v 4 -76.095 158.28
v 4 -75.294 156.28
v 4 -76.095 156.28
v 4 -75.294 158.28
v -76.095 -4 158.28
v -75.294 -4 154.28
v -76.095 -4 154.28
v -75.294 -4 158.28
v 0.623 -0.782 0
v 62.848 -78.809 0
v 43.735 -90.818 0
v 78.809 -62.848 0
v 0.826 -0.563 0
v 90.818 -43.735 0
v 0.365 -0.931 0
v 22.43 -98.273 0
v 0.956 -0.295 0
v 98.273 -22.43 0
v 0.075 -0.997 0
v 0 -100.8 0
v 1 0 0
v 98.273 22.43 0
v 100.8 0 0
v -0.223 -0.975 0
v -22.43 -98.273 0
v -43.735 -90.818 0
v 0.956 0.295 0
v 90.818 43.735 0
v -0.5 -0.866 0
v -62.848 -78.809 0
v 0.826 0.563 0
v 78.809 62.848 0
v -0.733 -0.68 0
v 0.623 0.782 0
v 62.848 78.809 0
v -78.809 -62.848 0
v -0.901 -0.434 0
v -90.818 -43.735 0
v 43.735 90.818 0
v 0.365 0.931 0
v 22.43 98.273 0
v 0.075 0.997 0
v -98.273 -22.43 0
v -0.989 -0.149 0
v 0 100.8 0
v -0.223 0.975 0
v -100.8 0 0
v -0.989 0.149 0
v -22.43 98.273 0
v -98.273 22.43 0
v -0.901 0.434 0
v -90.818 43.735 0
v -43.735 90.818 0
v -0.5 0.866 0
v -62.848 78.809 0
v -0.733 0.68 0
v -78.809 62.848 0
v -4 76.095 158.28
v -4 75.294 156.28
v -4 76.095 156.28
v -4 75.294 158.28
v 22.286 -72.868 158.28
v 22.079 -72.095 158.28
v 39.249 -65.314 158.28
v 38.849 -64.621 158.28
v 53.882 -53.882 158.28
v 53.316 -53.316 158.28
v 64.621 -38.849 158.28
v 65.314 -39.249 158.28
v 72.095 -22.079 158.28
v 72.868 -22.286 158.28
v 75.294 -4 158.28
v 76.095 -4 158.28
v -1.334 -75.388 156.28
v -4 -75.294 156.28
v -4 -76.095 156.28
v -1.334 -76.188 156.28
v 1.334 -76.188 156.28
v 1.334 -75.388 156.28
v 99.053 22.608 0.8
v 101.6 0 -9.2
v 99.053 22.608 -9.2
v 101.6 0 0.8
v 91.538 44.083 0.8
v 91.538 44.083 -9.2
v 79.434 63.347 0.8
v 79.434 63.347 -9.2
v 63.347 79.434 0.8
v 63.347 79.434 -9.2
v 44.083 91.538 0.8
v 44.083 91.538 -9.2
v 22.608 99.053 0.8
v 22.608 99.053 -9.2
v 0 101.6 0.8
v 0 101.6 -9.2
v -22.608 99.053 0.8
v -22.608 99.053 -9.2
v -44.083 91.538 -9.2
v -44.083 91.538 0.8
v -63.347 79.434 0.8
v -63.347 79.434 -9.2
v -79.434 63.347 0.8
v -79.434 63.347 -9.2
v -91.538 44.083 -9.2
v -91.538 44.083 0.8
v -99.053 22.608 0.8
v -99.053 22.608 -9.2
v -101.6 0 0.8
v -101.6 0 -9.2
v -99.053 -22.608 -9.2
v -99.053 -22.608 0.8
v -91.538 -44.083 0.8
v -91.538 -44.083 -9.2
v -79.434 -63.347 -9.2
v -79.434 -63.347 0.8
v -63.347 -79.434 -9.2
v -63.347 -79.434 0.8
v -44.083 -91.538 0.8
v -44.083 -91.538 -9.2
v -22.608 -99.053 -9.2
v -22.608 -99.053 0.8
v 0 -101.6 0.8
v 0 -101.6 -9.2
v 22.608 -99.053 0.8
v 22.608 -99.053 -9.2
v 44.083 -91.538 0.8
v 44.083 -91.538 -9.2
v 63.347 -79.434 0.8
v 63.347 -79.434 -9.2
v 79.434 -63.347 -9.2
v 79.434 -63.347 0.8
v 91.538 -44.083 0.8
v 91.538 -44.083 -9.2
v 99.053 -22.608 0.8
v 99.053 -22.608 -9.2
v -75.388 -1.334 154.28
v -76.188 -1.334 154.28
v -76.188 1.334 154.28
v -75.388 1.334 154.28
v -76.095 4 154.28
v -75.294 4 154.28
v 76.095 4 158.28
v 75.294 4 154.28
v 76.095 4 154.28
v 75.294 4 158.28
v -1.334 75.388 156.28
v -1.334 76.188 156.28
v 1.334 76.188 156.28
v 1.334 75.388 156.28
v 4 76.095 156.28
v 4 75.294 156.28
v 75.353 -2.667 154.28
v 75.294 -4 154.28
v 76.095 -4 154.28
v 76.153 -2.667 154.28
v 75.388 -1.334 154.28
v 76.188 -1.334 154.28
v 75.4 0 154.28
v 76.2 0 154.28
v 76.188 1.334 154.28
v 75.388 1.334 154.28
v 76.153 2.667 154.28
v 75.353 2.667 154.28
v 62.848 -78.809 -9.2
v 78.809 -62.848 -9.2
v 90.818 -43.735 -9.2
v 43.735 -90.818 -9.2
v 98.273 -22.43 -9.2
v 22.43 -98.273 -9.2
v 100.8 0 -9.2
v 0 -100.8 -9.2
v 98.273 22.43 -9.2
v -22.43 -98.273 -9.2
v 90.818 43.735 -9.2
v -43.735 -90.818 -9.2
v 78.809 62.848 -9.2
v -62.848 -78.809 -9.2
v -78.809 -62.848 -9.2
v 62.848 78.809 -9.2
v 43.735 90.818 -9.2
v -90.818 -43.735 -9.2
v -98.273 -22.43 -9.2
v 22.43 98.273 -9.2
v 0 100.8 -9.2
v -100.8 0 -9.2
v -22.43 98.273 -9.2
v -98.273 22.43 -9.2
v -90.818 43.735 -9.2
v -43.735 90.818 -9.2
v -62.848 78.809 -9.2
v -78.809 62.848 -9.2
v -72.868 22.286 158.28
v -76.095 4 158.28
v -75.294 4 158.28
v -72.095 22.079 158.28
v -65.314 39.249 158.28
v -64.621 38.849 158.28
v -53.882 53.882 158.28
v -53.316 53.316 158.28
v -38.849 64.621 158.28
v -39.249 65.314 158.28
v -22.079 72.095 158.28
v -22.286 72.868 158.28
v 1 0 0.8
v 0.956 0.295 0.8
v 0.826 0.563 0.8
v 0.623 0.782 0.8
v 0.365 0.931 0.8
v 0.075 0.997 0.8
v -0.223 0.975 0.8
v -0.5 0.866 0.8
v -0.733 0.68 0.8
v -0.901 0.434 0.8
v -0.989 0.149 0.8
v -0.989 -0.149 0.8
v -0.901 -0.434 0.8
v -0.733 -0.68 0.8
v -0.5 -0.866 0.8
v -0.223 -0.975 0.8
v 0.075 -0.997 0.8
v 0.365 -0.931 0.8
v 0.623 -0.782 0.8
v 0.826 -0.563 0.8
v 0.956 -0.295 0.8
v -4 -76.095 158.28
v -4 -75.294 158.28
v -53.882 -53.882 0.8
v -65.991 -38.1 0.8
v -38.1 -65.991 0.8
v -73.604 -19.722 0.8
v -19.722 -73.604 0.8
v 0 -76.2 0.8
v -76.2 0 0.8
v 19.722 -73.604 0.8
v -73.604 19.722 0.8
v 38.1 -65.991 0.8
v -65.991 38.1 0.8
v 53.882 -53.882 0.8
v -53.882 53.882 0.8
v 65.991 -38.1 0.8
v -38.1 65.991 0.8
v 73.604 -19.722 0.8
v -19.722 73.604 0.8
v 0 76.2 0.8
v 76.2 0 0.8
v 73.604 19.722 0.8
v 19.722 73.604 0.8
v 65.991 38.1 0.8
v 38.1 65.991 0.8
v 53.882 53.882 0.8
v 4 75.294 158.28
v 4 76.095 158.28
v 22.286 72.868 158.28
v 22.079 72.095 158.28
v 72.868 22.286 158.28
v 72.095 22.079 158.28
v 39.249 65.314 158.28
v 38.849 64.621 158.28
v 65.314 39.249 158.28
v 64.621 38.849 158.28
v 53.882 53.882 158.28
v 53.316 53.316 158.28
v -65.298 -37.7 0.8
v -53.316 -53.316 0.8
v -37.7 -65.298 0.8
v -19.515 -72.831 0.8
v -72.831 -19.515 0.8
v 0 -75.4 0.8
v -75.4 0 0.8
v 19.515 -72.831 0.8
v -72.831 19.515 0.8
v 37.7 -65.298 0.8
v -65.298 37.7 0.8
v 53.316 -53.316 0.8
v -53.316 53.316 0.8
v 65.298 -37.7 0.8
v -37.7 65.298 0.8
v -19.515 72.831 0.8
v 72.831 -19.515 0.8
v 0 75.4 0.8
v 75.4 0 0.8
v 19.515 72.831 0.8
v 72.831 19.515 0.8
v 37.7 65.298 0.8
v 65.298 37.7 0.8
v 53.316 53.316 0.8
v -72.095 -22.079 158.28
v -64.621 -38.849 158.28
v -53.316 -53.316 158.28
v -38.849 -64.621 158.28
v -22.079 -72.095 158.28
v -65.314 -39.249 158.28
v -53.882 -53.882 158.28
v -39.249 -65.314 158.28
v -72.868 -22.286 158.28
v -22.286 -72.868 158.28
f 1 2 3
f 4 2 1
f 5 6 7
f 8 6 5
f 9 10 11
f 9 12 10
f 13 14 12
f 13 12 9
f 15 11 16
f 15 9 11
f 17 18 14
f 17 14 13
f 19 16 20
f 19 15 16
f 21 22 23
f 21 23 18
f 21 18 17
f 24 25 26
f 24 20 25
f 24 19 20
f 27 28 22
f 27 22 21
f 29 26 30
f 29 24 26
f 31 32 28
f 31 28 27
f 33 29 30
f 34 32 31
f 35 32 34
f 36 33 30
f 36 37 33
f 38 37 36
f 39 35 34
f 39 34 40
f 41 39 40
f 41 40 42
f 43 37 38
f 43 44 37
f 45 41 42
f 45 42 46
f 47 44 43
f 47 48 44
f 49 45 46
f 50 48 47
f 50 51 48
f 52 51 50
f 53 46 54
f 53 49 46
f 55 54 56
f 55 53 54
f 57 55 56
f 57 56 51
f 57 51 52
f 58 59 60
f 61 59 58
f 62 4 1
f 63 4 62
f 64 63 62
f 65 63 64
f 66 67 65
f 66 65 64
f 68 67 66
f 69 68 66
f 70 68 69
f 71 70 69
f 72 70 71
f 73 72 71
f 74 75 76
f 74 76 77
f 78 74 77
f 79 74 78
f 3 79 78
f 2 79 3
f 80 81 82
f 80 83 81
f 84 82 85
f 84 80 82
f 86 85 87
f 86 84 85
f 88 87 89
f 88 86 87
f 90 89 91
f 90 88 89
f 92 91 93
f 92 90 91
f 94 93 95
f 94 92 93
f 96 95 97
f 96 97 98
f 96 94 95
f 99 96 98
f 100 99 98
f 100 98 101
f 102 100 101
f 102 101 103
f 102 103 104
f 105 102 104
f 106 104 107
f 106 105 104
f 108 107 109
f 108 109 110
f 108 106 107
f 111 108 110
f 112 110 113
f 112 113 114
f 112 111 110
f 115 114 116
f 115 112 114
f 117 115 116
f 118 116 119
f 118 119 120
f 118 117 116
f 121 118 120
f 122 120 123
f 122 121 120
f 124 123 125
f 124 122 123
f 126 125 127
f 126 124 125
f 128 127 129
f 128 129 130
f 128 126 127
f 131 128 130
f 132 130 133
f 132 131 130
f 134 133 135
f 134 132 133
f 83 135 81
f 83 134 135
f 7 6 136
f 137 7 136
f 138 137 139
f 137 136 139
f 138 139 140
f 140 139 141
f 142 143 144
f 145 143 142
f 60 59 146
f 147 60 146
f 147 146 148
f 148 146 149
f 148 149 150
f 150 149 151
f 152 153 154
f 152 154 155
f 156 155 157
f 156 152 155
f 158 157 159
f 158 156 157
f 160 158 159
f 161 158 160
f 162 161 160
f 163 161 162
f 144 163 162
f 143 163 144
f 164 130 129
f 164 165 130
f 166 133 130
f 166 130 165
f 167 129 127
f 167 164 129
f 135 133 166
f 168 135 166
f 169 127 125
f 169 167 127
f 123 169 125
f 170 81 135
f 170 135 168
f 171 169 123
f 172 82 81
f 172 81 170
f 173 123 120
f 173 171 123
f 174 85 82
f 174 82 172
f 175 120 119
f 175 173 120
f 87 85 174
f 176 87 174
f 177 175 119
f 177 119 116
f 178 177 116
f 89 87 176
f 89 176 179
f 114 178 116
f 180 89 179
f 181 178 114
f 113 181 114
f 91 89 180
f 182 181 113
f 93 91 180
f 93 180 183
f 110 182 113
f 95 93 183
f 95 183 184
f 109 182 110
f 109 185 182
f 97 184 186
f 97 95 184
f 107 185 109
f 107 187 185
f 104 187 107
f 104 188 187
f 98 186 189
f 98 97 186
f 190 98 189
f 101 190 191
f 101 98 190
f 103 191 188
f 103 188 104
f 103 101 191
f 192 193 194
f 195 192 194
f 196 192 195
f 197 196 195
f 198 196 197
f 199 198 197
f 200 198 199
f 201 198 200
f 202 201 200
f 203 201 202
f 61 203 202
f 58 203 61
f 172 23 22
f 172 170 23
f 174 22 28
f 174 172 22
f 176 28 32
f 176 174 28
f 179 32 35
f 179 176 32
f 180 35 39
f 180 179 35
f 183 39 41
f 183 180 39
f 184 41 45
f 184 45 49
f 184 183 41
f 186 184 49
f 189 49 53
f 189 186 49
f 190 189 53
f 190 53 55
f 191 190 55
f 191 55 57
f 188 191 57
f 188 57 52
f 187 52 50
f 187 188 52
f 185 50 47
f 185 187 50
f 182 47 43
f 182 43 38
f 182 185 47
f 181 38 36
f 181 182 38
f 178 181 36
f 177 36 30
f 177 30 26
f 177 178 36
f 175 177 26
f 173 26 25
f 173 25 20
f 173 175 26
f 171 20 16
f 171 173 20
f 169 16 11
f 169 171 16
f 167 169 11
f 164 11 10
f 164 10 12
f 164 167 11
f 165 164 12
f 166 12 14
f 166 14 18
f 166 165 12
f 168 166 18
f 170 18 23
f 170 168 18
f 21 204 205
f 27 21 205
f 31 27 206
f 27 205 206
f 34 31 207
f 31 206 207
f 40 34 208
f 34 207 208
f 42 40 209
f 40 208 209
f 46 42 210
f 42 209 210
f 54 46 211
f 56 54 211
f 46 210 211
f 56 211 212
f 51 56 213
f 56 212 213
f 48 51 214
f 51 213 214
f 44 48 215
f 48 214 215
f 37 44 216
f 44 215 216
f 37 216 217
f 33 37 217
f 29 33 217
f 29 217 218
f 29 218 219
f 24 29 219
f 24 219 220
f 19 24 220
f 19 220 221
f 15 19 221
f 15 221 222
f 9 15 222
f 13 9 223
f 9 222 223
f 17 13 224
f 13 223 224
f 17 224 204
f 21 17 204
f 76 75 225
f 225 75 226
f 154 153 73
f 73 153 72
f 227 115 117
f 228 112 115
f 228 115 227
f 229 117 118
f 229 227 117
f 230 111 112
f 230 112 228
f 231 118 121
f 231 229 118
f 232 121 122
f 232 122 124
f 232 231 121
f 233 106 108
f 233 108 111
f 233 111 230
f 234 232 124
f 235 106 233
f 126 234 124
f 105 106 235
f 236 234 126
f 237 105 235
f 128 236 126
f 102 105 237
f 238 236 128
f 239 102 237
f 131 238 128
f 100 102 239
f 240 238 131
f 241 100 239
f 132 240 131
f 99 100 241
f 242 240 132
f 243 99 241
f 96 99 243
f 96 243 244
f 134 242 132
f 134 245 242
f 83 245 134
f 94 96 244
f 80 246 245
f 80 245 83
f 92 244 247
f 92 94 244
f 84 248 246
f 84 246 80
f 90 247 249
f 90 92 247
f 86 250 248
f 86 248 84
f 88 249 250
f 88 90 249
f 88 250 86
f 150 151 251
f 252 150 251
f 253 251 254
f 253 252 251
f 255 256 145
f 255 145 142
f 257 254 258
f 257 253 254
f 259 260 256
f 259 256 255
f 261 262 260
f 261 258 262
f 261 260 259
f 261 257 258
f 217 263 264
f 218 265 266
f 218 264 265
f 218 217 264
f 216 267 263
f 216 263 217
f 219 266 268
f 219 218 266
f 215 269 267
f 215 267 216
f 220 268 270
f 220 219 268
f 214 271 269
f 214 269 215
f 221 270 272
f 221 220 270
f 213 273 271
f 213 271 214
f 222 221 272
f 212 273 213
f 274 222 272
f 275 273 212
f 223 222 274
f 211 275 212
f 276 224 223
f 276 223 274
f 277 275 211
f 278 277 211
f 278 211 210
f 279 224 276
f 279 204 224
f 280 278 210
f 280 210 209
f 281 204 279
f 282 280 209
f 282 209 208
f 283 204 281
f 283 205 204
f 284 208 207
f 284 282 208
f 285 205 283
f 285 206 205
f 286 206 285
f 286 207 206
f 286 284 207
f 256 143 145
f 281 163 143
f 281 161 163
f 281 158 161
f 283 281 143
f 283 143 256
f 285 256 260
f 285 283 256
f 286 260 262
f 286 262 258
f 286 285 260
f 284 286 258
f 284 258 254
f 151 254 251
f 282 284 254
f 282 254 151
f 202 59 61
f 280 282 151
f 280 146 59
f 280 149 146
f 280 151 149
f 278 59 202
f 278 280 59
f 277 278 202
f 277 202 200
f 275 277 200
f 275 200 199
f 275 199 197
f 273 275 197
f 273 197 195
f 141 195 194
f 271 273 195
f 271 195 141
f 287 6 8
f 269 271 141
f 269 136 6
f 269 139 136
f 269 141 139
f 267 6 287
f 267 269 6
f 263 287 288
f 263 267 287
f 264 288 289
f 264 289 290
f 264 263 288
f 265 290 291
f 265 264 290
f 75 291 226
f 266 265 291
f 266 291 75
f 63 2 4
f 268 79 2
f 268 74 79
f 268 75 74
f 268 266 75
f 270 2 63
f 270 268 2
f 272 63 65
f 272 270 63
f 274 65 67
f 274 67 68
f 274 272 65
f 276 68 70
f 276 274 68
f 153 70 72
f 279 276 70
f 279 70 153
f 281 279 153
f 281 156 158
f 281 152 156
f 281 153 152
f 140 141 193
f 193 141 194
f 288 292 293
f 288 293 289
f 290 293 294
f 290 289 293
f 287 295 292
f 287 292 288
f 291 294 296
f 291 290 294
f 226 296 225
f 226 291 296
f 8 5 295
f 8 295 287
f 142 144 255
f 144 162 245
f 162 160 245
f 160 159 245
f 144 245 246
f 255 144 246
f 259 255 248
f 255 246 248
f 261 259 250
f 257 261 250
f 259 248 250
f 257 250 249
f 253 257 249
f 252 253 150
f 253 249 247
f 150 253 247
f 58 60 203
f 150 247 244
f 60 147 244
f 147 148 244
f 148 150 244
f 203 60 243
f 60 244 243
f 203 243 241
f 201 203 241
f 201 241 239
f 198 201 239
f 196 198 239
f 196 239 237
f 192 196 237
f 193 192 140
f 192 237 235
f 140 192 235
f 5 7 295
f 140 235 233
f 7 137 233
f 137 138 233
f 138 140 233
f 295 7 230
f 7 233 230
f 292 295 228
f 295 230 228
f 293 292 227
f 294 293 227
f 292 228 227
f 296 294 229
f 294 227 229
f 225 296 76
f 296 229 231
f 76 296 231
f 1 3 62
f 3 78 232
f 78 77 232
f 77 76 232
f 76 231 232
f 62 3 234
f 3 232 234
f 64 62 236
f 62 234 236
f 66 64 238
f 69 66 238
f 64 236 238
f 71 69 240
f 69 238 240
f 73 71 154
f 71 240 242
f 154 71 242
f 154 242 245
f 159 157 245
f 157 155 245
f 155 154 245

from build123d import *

# Parameters (mm, degrees)
F0_R          = 76.2
F1_DEPTH      = 158.28
F2_T          = -0.8
F3_R          = 1
F4_DEPTH      = 0.8
F5_W          = 8
F5_H          = 2
F6_DEPTH      = 76.201
F6_DEPTH_BACK = 76.201
F7_W          = 8
F7_H          = 4
F8_DEPTH      = 76.201
F8_DEPTH_BACK = 76.201


with BuildPart() as f1:
    # F0 (on Top) → F1 (new body)
    with BuildSketch(Plane.XY):
        Circle(F0_R)
    extrude(amount=F1_DEPTH)

    # F2
    f2_openings = [f1.faces().sort_by_distance(p)[0] for p in [
        (0, 0, 158.28),
    ]]
    offset(amount=F2_T, openings=f2_openings)

    # F3 (on face) → F4 (cut, through all)
    with BuildSketch(Plane.XY.offset(0.8)):
        Circle(F3_R)
    extrude(amount=-F4_DEPTH, mode=Mode.SUBTRACT)

    # F5 (on Front) → F6 (cut, two sides)
    with BuildSketch(Plane.XZ) as f6_sk:
        with Locations((0, 157.28)):
            Rectangle(F5_W, F5_H)
    extrude(amount=-F6_DEPTH, mode=Mode.SUBTRACT)
    extrude(f6_sk.sketch, amount=F6_DEPTH_BACK, mode=Mode.SUBTRACT)

    # F7 (on Right) → F8 (cut, two sides)
    with BuildSketch(Plane.YZ) as f8_sk:
        with Locations((0, 156.28)):
            Rectangle(F7_W, F7_H)
    extrude(amount=-F8_DEPTH, mode=Mode.SUBTRACT)
    extrude(f8_sk.sketch, amount=F8_DEPTH_BACK, mode=Mode.SUBTRACT)

    # F9 (on Front) → F10 (revolve)
    with BuildSketch(Plane.XZ):
        Polygon((76.2, 0.8), (76.2, 0), (100.8, 0), (100.8, -9.2), (101.6, -9.2), (101.6, 0.8), align=None)
    revolve(axis=Axis((0, 0, 18.5718685389), (0, 0, 1)))


solid = f1.part
